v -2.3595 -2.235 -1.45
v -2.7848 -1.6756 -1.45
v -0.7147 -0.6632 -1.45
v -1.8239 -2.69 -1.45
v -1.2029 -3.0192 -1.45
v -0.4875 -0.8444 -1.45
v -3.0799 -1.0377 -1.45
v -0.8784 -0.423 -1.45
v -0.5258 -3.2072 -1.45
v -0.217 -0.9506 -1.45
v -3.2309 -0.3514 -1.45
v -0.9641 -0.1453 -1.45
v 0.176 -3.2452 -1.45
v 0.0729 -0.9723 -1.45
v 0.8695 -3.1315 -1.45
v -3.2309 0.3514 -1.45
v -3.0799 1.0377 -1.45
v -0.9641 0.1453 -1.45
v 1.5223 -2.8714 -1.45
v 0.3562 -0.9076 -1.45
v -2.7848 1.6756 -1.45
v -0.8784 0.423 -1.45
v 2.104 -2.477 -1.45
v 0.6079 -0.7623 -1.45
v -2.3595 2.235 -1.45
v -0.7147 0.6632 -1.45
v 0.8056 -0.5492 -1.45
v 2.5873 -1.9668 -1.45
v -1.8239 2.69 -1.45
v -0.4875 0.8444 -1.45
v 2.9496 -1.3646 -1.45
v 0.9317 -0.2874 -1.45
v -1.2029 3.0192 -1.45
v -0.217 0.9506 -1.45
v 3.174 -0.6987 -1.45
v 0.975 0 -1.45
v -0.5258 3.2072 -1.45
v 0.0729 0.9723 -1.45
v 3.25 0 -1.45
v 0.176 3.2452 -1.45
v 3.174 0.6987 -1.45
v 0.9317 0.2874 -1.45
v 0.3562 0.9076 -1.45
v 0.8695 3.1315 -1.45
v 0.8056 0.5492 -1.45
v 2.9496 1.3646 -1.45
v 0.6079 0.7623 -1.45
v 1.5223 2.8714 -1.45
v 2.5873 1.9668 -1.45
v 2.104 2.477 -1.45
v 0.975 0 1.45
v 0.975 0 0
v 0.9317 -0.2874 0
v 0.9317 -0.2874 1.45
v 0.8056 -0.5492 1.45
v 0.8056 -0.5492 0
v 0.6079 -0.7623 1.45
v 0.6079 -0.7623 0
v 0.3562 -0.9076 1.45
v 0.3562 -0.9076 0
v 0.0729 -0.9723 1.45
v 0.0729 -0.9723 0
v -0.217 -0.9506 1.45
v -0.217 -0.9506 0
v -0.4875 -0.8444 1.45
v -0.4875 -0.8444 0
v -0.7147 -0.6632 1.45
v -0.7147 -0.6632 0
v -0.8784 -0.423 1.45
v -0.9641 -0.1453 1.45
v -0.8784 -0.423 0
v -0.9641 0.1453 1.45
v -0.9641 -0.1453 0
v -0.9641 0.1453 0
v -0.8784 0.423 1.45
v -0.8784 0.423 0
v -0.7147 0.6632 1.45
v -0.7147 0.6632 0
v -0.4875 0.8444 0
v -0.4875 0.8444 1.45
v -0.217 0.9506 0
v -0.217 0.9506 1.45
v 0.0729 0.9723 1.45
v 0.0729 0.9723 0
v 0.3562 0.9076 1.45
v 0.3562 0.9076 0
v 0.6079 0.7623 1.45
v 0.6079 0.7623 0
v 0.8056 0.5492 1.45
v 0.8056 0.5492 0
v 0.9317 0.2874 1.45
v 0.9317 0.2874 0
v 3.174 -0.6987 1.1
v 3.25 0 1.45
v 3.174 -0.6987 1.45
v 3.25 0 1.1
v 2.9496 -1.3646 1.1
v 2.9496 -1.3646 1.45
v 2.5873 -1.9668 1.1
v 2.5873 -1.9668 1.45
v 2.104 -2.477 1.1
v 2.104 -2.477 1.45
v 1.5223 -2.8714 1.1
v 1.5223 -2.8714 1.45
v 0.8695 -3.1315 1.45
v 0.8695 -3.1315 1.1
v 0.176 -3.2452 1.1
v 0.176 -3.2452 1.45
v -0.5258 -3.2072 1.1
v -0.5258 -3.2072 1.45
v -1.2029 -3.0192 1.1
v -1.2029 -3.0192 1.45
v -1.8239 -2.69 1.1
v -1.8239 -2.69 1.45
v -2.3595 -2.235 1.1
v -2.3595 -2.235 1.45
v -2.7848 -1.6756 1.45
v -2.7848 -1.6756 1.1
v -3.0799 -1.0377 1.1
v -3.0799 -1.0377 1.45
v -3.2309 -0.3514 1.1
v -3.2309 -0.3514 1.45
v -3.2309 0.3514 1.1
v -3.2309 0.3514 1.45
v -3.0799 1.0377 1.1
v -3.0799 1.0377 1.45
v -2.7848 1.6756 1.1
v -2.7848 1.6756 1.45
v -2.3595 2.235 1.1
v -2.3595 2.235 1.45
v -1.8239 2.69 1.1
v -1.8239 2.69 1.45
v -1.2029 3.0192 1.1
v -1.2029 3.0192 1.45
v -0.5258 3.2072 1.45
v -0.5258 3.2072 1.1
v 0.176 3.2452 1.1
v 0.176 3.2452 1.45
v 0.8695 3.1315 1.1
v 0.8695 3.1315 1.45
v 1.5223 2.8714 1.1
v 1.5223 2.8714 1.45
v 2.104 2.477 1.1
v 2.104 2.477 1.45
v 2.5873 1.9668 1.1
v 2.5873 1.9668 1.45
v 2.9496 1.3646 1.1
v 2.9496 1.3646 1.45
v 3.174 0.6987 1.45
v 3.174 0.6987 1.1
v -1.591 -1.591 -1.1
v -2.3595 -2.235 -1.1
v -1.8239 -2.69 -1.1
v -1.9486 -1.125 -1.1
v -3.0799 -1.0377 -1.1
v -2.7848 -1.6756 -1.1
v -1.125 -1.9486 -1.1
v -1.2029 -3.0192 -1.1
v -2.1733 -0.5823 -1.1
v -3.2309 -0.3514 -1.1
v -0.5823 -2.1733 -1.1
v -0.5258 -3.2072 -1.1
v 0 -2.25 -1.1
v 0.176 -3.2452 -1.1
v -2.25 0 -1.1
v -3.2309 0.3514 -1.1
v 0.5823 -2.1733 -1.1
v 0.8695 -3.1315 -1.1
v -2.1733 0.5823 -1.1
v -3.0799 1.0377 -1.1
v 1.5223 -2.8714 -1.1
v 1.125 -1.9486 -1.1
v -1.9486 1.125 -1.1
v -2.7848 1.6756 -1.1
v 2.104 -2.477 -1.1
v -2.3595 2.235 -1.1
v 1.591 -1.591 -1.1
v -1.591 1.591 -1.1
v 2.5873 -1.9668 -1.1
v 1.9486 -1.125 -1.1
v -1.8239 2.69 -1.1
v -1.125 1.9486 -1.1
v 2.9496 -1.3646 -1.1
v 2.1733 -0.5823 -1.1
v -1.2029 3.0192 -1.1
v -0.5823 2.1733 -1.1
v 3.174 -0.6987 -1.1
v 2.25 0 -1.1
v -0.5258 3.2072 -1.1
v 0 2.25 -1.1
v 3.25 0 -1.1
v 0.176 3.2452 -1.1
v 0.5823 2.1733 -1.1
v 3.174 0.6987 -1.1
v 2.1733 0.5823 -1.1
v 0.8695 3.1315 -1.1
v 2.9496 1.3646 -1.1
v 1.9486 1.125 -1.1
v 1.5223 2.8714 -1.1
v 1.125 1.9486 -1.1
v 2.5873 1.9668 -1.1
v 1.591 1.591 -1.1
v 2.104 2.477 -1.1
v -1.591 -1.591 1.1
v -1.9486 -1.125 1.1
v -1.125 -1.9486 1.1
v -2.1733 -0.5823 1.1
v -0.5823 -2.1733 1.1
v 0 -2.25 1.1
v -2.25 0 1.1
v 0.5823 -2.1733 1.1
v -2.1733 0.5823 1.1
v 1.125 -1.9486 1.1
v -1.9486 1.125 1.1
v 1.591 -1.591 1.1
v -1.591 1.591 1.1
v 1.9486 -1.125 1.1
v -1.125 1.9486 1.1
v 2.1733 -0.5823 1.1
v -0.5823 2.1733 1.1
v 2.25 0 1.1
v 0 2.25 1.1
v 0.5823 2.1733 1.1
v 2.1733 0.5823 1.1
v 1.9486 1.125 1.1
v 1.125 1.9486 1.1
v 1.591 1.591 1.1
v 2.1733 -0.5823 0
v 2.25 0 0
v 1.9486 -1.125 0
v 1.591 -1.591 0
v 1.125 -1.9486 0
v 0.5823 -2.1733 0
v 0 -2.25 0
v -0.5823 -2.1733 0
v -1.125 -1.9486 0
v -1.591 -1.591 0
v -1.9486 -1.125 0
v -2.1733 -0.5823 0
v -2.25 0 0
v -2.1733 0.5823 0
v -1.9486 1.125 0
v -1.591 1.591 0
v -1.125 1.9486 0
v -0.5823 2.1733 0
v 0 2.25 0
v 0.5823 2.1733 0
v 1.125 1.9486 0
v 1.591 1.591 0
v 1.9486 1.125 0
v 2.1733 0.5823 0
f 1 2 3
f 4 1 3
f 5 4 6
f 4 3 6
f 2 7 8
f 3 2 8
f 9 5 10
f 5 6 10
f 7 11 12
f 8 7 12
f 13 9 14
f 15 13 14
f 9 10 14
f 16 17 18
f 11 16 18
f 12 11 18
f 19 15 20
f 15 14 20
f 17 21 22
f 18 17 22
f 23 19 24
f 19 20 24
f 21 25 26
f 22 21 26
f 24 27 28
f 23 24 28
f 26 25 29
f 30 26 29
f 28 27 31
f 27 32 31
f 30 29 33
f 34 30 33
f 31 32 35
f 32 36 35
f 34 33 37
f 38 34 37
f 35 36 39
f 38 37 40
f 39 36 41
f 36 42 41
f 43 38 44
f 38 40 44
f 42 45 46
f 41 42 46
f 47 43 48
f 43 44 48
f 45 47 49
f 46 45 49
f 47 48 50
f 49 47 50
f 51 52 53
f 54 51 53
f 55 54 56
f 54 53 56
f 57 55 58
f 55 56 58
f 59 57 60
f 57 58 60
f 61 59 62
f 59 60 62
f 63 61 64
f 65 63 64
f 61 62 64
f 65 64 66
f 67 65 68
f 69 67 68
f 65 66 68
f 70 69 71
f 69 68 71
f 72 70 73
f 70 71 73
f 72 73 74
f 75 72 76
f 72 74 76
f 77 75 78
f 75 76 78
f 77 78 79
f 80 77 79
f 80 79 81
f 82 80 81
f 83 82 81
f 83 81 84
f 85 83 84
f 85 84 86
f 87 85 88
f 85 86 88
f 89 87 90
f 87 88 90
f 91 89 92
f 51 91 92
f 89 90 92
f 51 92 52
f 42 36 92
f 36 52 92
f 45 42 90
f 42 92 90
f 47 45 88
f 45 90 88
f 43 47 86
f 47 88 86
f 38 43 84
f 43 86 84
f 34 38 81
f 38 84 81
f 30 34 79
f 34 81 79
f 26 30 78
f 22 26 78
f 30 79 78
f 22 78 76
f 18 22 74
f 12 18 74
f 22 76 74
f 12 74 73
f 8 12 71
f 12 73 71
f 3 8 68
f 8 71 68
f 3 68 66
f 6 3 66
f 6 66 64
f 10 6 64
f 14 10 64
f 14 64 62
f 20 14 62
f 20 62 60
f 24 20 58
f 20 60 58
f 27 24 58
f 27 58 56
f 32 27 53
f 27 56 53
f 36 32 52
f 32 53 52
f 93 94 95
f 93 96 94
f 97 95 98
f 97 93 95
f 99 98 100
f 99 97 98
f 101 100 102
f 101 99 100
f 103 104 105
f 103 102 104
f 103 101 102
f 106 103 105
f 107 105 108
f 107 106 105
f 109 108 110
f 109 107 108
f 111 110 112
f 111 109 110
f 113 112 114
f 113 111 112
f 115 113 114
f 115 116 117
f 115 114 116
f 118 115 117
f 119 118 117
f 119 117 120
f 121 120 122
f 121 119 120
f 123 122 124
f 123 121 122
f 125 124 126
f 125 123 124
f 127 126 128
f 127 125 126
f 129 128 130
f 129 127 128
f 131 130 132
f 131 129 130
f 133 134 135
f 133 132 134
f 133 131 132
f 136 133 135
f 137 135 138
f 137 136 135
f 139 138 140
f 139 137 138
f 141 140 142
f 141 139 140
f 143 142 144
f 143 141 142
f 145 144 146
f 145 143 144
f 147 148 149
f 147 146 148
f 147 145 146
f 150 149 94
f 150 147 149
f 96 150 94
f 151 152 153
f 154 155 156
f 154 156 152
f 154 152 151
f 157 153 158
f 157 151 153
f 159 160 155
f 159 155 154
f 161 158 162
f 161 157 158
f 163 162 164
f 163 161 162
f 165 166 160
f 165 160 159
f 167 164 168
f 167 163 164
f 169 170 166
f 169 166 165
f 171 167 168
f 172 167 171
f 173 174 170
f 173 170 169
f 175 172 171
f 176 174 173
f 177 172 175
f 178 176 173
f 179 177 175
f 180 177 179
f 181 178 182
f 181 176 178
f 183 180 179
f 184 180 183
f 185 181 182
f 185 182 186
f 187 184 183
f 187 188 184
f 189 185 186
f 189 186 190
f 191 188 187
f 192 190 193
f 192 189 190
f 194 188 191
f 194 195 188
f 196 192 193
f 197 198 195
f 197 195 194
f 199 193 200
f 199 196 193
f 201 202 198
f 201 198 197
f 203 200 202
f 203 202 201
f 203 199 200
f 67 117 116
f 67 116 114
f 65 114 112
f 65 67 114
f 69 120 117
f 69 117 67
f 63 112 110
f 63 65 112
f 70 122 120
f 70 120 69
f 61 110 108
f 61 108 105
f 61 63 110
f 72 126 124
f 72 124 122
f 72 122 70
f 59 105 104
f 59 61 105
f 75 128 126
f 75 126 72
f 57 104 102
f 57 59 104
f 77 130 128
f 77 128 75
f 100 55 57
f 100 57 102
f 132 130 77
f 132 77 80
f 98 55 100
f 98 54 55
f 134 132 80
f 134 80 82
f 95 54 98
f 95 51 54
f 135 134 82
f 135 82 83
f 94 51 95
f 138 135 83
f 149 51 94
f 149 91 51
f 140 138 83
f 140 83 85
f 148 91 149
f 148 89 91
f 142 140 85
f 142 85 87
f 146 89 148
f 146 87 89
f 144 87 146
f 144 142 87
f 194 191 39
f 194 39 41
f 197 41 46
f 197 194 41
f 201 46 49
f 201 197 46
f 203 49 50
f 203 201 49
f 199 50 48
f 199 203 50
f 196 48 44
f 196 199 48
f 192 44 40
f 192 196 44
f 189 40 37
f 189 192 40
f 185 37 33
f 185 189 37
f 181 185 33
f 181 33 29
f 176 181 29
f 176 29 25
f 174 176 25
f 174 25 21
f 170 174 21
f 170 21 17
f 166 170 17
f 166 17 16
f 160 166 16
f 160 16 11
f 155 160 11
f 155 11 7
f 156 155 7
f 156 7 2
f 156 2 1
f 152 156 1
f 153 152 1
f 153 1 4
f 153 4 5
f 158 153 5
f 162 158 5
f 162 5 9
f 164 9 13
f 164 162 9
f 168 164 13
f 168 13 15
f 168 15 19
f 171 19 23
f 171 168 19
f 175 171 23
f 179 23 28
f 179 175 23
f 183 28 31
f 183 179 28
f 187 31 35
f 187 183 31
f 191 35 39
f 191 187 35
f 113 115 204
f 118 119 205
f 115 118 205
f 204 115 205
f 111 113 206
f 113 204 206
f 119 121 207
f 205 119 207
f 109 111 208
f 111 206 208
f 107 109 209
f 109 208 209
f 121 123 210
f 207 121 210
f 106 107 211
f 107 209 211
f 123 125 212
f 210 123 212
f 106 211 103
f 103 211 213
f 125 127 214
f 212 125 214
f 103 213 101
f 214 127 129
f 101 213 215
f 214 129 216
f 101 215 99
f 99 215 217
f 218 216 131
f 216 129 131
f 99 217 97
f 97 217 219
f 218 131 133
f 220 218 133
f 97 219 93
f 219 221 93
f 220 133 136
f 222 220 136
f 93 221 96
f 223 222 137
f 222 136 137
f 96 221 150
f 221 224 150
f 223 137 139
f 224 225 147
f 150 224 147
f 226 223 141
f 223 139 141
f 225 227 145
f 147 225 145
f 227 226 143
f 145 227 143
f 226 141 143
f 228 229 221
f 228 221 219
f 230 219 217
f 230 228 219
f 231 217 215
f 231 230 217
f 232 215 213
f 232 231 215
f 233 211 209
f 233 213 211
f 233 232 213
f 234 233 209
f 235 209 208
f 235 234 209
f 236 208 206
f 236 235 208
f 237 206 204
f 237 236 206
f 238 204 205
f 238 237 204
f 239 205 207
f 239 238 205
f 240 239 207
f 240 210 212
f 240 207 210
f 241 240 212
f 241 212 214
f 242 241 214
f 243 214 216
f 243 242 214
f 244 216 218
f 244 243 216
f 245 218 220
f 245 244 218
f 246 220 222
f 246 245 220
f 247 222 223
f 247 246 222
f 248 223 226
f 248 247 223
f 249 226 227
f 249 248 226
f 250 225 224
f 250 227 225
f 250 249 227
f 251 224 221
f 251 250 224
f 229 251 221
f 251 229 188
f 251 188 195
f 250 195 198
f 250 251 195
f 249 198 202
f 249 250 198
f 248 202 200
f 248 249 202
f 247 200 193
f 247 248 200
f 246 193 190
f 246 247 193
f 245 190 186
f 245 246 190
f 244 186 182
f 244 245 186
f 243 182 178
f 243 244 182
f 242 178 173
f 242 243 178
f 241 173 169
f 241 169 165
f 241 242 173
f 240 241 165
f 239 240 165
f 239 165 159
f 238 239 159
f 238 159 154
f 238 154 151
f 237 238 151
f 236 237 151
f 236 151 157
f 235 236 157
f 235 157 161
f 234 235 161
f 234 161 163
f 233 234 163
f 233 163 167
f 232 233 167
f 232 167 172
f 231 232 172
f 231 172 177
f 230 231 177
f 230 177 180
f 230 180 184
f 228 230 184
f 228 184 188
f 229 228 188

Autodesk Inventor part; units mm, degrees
ref_plane "YZ Plane" through (0, 0, 0) normal (1, 0, 0) x (0, 1, 0)
ref_plane "XZ Plane" through (0, 0, 0) normal (0, 1, 0) x (-1, 0, 0)
ref_plane "XY Plane" through (0, 0, 0) normal (0, 0, 1) x (1, 0, 0)
sketch "Sketch1" plane through (0, 0, 0) normal (0, 0, 1) x (1, 0, 0)
  circle A0 centre (0, 0) radius 3.25
  dimension "d0" = 6.5
extrude "Roller Base" add sketch "Sketch1" along normal mid plane 2.9
sketch "Sketch2" plane through (0, 0, 0) normal (0, 0, 1) x (1, 0, 0)
  circle A0 centre (0, 0) radius 0.975
  dimension "d3" = 1.95
extrude "Roller Axis" cut sketch "Sketch2" along normal through all both and the other way through all
sketch "Sketch3" plane through (0, 0, 0) normal (0, 0, 1) x (1, 0, 0)
  circle A0 centre (0, 0) radius 0.975 projected
  circle A1 centre (0, 0) radius 3.25 projected
  circle A2 centre (0, 0) radius 2.25
  dimension "d6" = 4.5
extrude "Roller Bar Fit" cut sketch "Sketch3" along normal mid plane 2.2 contours A1
properties part number "Roller" material "Brass, Soft Yellow, Welded"
